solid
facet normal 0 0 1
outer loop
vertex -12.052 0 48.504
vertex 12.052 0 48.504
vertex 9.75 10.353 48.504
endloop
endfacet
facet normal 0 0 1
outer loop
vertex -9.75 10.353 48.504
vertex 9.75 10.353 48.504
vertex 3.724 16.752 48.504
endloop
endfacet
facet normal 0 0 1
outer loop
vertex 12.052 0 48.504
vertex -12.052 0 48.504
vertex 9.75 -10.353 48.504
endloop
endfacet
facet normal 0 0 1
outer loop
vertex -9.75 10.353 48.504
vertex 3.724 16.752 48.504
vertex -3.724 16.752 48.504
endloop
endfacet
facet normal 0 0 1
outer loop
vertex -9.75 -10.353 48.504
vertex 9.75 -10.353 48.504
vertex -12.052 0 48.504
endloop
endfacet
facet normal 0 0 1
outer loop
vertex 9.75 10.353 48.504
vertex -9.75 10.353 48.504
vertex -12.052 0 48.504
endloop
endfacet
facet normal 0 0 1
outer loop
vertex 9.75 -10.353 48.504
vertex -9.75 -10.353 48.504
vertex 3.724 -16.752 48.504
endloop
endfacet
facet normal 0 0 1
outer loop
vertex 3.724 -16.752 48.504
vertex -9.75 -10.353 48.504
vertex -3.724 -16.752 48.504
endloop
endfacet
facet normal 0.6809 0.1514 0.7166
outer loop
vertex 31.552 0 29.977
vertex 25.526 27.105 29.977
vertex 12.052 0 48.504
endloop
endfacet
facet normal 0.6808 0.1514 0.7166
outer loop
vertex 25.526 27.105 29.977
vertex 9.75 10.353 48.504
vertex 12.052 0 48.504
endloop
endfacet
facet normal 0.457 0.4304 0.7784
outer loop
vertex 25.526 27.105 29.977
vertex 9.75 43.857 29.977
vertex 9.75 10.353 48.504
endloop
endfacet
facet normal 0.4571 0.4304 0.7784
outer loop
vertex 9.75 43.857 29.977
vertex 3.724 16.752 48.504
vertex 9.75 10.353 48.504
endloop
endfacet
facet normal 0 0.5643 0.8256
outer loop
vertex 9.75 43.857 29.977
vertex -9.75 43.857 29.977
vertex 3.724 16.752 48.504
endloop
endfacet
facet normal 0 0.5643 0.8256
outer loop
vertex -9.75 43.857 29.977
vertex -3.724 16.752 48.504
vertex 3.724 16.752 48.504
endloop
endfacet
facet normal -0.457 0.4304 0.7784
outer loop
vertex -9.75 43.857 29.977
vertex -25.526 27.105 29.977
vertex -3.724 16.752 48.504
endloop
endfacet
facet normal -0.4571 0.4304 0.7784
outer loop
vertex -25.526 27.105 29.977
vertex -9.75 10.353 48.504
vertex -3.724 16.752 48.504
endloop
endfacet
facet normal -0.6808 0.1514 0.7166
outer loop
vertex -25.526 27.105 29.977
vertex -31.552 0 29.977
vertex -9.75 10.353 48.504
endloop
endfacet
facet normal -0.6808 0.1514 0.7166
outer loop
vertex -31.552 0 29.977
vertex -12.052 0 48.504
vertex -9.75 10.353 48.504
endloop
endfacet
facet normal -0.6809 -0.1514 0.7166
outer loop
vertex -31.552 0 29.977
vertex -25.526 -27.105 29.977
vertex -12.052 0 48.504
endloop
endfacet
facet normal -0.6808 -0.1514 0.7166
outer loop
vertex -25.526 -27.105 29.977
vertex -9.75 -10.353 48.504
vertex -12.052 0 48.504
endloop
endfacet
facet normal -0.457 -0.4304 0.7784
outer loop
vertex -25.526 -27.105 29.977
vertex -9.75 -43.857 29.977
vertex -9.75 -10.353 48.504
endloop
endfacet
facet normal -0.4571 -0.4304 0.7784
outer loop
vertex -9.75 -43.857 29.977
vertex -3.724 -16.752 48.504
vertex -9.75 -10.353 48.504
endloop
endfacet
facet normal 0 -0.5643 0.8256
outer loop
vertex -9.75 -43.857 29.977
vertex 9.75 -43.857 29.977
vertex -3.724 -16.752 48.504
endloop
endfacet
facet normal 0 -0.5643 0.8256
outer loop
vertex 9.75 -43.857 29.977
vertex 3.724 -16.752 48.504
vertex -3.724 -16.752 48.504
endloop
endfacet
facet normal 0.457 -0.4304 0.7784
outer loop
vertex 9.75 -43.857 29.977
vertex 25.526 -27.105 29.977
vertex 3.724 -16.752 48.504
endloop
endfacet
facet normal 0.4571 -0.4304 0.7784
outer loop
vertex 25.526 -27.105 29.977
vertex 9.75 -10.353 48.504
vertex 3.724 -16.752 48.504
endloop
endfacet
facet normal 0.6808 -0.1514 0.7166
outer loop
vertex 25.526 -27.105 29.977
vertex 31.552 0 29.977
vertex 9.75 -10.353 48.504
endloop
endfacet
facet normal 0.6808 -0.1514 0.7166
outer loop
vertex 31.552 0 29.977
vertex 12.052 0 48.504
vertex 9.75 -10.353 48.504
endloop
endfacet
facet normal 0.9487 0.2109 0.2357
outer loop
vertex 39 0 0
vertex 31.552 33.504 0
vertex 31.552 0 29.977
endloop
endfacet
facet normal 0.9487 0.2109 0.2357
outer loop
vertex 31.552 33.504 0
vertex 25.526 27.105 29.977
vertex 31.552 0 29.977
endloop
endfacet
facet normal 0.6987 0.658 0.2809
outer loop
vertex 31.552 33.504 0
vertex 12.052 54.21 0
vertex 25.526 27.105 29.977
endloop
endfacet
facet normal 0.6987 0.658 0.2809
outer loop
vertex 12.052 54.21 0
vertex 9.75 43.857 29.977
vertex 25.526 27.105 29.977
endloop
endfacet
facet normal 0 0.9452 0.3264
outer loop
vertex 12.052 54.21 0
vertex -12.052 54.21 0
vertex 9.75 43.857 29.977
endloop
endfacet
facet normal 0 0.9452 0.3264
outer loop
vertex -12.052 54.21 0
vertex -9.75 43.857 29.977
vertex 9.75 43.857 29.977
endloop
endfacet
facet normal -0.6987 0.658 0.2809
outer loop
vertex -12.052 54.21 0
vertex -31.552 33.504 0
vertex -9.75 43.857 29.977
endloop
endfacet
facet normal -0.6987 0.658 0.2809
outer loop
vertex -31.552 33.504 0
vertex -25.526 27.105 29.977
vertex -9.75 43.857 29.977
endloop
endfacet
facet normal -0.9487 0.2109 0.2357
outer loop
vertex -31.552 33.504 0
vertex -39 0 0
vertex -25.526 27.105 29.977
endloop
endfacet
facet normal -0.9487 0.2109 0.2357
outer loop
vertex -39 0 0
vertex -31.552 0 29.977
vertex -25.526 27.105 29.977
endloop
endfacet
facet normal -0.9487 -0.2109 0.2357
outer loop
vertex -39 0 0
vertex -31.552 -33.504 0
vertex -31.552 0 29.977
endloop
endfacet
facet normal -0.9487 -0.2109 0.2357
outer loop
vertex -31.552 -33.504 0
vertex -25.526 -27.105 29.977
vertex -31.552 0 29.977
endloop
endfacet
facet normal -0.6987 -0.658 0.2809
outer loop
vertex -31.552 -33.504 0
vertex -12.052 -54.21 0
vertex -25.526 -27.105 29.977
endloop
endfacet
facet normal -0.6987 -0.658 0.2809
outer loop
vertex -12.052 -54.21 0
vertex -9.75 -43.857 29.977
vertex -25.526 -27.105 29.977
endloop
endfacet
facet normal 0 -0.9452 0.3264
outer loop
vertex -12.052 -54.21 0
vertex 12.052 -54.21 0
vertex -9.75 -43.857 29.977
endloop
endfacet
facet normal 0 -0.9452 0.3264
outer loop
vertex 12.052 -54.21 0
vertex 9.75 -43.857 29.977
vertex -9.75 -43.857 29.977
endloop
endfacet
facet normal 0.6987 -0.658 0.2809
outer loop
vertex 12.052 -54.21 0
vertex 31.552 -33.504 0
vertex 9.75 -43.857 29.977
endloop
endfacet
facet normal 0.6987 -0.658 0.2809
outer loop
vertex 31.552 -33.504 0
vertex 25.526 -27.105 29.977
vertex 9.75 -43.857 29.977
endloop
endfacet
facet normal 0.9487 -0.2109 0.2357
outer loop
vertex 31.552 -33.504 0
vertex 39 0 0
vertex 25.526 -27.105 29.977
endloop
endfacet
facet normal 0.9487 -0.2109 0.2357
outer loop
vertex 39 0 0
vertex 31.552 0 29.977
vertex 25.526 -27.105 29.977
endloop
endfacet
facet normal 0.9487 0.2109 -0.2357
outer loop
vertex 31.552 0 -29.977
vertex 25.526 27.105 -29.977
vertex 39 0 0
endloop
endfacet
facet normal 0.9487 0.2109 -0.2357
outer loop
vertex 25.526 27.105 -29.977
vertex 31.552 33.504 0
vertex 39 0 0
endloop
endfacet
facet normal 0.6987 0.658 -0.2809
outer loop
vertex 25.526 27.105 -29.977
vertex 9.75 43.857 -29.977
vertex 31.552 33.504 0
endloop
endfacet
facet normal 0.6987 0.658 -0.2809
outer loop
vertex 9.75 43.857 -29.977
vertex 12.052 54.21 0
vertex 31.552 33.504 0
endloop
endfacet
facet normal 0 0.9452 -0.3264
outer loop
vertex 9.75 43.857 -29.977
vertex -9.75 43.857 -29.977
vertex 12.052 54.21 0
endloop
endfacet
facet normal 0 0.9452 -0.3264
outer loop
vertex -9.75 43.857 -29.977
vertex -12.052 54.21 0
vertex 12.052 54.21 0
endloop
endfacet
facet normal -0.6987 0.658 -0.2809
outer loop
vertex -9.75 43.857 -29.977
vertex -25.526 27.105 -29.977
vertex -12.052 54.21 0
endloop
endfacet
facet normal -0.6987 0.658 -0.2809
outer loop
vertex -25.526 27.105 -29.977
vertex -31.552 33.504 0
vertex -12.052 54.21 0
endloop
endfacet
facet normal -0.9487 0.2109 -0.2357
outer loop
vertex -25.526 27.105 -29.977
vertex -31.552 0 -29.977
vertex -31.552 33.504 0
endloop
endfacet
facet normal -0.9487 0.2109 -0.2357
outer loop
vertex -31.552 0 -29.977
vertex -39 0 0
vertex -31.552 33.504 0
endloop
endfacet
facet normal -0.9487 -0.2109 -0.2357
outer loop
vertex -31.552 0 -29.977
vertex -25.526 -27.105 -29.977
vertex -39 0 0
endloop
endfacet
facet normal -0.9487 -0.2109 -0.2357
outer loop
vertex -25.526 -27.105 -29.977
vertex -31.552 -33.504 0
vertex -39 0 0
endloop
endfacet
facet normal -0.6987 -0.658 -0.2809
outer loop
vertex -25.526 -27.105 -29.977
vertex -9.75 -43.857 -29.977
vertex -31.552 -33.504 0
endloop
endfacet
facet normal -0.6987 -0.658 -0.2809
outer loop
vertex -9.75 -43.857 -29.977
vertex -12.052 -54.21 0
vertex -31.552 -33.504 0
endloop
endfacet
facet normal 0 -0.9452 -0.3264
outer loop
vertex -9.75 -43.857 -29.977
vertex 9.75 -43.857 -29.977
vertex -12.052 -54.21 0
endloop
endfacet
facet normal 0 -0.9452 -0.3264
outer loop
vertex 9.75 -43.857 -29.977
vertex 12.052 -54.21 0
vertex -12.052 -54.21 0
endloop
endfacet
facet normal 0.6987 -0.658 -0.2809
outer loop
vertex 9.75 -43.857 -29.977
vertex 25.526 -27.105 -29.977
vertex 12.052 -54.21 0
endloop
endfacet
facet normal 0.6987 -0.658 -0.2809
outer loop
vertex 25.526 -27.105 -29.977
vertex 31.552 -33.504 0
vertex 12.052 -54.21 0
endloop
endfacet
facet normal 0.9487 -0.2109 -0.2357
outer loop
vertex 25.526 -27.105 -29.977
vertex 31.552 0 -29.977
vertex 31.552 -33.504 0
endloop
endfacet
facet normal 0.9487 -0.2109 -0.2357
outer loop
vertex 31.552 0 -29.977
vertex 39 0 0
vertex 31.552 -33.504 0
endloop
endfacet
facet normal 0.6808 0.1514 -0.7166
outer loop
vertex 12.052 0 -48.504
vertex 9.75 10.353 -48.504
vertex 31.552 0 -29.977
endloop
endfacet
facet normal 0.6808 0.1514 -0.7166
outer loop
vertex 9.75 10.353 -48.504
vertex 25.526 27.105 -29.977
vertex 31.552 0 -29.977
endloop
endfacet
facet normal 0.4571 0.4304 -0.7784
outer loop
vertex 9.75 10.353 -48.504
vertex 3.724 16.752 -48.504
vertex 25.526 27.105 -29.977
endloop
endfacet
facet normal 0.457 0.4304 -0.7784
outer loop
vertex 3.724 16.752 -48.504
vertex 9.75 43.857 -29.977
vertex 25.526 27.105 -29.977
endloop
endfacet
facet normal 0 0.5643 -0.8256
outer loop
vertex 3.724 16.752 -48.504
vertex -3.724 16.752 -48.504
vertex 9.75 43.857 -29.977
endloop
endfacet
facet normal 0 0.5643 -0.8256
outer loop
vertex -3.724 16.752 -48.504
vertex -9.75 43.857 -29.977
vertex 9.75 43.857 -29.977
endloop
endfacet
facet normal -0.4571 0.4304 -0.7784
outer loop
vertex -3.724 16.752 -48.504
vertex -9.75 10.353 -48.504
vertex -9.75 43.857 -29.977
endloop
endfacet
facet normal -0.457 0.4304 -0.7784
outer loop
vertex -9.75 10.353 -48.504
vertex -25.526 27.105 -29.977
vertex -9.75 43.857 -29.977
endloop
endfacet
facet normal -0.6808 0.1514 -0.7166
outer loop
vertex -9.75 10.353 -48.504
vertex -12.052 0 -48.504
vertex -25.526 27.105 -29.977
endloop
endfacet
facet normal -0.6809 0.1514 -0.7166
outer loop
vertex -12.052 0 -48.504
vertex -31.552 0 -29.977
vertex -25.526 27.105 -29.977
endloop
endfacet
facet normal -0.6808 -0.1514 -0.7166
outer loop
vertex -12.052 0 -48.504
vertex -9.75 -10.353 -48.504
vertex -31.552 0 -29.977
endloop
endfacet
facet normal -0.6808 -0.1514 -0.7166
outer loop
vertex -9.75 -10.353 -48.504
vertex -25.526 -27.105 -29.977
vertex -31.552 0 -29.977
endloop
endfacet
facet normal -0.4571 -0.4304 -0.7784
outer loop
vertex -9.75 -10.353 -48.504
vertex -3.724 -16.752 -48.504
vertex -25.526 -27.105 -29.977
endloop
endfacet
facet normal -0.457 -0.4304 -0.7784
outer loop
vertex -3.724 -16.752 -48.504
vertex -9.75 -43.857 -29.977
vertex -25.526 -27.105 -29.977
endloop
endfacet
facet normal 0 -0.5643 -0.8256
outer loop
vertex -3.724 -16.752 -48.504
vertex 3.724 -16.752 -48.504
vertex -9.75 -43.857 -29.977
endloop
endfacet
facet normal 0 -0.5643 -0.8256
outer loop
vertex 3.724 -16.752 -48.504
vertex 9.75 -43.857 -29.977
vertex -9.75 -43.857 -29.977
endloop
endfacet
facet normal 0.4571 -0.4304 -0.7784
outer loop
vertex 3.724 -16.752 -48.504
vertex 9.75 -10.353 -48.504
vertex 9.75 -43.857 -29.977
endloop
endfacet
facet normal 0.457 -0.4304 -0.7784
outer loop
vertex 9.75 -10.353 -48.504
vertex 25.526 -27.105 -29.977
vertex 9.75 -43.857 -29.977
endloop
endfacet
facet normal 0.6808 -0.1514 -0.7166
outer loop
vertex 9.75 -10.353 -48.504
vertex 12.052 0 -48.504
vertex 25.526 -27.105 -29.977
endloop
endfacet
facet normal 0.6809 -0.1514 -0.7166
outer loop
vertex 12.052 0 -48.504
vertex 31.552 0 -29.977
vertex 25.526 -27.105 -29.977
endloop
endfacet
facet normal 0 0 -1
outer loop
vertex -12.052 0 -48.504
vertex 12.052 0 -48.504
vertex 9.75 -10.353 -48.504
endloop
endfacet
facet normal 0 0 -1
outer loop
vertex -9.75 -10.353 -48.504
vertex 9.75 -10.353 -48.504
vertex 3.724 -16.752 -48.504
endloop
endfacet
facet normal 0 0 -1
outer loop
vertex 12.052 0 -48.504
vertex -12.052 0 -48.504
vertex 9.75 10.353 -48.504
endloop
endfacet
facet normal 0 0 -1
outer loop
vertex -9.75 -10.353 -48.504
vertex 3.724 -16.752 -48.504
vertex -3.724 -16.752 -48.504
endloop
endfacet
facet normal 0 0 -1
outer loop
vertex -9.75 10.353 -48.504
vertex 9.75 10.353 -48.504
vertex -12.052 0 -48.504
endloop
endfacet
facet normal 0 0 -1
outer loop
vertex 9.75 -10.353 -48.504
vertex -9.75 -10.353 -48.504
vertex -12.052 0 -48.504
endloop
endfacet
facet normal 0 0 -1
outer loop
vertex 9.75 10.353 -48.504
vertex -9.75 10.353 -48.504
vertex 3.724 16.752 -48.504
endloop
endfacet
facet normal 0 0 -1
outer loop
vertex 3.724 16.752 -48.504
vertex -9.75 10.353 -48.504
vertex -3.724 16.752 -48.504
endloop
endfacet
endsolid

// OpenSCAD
// Generated by SolidPython 1.0.1 on 2020-07-29 00:46:51


scale(v = [13, 19, 17]) {
	sphere(r = 3);
}
/***********************************************
*********      SolidPython code:      **********
************************************************
 
# import packages: SolidPython
from solid import *
from solid.utils import *
from itertools import chain, combinations, permutations


class Resize:

    def __init__(self, scad_file):
        self.scad_file = scad_file
        #self.scad_file = import_scad(scad_file)
        # cone/cylinder param:
        self.r1 = 0
        self.r2 = 0
        self.h = 0
        # rectangular prism param:
        self.w = 0
        self.l = 0
        # ellipse param:
        self.r = 0

    # import OpenScad code (file name corresponds to shape)


    # classify shape + parameters
    def assign(self, param1, param2, param3):
        if self.scad_file == 'cone.scad':
            self.r1 = param1
            self.r2 = param2
            self.h = param3
        elif self.scad_file == 'cylinder.scad':
            self.r1 = param1
            self.r2 = param2
            self.h = param3
        elif self.scad_file == 'rectangularPrism.scad':
            self.h = param1
            self.l = param2
            self.w = param3
        else:
            self.r = param1
            self.h = param2

    # resize parameters
    def iterate(self):
        x = range(3, 20, 2)
        i = 1
        if self.scad_file == 'cone.scad':
            tempList = list(permutations(x, 2))
            for temp in tempList:
                param1 = temp[0]
                param2 = temp[1]
                filepath = 'produced_scad_files/' + 'cone' + str(param1) + '_' + str(param2) + '_' + '.scad'
                scad_render_to_file(cylinder(h=param1, r1=param2, r2=0), filepath)

        elif self.scad_file == 'cylinder.scad':
            tempList = list(permutations(x, 3))
            for temp in tempList:
                param1 = temp[0]
                param2 = temp[1]
                filepath = 'produced_scad_files/' + 'cylinder' + str(param1) + '_' + str(param2) + '_' + '.scad'
                scad_render_to_file(cylinder(h=param1, r1=param2, r2=param2), filepath)

        elif self.scad_file == 'rectangularPrism.scad':
            tempList = list(permutations(x, 3))
            for temp in tempList:
                param1 = temp[0]
                param2 = temp[1]
                param3 = temp[2]
                filepath = 'produced_scad_files/' + 'rectangularPrism' + str(param1) + '_' + str(param2) + '_' + str(
                    param3) + '.scad'
                scad_render_to_file(cube(size=(param1, param2, param3)), filepath)

        elif self.scad_file == 'ellipse.scad':
            tempList = list(permutations(x, 4))
            for temp in tempList:
                param1 = temp[0]
                param2 = temp[1]
                param3 = temp[2]
                param4 = temp[3]
                filepath = 'produced_scad_files/' + 'ellipse' + str(param1) + '_' + str(param2) + '_' + str(param3) + '_' + str(param4) + '.scad'
                scad_render_to_file(scale([param1, param2, param3])(sphere(r=param4)), filepath)

    def render_to_scadfile(self):
        scad_render_to_file(scad, 'example.scad') 
 
************************************************/
